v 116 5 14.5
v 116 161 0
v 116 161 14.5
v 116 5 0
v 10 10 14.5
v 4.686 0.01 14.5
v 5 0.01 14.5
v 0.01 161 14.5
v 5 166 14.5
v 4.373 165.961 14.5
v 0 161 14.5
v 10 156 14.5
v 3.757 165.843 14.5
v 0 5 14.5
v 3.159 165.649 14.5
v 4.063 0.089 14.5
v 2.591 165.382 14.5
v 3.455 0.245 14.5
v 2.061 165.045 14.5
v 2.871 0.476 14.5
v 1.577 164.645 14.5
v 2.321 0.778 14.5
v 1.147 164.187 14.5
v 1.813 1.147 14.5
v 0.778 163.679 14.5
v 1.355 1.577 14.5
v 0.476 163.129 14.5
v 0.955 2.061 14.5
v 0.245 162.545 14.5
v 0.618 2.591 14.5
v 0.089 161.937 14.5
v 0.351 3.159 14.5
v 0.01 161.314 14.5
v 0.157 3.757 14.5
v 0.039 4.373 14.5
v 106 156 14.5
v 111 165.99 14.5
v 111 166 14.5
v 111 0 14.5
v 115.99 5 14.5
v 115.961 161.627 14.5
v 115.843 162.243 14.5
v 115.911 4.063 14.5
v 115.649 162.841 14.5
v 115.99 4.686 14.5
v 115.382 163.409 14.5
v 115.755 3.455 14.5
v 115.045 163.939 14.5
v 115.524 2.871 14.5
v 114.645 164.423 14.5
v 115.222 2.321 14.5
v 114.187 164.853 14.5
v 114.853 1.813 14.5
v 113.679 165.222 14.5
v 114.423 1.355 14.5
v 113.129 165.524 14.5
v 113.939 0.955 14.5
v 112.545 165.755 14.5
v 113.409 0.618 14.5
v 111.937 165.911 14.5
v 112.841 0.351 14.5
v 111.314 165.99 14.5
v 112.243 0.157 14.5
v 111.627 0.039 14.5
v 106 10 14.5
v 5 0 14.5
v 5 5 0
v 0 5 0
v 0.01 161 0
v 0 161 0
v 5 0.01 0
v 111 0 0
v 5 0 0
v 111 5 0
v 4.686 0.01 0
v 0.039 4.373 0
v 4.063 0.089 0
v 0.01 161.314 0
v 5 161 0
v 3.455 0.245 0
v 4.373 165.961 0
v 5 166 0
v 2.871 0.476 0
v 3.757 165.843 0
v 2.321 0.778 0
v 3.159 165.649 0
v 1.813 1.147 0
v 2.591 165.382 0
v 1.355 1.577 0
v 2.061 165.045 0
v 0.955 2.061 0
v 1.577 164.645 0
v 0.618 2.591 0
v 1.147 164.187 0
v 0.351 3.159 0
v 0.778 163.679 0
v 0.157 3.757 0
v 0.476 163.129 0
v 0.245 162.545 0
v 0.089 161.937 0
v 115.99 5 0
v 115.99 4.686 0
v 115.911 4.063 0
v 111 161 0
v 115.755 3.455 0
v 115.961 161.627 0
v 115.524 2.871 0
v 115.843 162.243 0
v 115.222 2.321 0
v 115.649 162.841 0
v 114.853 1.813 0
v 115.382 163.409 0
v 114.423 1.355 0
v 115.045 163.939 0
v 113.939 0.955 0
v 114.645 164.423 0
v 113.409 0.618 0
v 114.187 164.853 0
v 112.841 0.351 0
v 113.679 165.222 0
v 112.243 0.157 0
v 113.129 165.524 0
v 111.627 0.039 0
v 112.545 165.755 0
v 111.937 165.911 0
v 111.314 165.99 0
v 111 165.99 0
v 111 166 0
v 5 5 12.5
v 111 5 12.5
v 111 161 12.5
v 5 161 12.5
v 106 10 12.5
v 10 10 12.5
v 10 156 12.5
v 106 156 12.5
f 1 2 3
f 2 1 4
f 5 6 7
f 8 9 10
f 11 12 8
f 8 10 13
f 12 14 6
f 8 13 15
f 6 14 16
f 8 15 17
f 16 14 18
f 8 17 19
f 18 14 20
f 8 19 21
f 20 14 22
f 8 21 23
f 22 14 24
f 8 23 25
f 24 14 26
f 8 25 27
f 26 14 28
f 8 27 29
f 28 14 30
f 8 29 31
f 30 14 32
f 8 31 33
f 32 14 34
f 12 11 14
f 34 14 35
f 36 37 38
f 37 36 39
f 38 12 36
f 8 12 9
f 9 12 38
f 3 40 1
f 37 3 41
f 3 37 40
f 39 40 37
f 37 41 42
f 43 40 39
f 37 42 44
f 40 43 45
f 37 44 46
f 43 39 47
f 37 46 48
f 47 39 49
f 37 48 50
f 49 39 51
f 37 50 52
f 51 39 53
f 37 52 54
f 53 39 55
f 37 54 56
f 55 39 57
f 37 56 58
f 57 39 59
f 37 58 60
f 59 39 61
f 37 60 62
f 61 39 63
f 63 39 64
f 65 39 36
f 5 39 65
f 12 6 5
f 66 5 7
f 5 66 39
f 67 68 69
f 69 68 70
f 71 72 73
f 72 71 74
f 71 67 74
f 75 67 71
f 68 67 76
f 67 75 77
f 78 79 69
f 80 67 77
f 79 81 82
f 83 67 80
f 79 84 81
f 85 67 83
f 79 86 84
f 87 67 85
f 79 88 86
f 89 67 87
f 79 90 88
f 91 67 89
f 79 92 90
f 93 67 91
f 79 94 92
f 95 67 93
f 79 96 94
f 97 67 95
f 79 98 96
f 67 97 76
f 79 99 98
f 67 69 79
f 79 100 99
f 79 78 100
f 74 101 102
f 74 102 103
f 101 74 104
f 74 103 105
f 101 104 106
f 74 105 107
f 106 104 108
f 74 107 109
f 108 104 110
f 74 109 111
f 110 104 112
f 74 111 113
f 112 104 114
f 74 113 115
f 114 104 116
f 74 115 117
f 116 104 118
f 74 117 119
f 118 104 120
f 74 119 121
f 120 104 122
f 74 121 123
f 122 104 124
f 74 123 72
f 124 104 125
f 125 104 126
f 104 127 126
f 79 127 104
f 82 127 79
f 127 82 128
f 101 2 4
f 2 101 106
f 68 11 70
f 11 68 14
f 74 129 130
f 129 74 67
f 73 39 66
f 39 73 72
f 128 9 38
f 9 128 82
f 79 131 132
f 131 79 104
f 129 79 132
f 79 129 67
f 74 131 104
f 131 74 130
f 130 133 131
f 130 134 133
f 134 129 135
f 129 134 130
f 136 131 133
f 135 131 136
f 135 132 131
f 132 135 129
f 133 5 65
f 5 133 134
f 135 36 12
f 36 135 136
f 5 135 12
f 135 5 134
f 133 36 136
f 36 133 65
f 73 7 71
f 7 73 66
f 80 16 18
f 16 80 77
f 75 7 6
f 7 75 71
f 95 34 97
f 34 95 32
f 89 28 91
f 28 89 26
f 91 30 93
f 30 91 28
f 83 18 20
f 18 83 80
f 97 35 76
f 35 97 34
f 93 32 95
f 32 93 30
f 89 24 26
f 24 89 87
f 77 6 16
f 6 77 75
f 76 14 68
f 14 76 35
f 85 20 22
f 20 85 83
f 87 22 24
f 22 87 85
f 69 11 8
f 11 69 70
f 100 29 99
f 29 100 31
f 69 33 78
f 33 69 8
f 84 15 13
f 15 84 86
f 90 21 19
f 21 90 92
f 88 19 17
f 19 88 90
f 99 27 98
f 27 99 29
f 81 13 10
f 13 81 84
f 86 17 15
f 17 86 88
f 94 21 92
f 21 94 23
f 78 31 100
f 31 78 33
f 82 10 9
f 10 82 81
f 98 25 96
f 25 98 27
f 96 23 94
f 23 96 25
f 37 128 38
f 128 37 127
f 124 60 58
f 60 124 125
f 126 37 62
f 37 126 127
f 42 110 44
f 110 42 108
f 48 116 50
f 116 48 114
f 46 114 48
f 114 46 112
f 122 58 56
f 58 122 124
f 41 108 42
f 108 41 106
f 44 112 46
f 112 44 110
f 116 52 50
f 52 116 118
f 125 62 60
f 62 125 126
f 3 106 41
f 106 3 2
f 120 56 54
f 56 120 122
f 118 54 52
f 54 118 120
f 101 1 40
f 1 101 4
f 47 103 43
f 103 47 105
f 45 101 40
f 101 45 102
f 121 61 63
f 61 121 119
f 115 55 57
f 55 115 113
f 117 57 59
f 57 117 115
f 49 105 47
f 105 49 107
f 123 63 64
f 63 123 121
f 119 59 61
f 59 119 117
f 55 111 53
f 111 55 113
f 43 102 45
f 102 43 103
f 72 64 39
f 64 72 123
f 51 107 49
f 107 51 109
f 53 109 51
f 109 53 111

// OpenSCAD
$fn=50;
// Width of the image format
image_width = 100;
// Height of the image format
image_length = 150;
// Tolerance of the image (normally the print is a few mm bigger)
image_tolerance = 2;
// Height of the Frame (10, 20, 40, 80, etc.)
height=10;
// Height of the small image border on top of the base plate, to get a glas front between image and cover
image_border_height = 2.5;
// Strength of the border
cover_border_strength = 5;
// Strength of the Head (which borders the image)
cover_head_strength=2;
// Width of the Head (which borders the image)
cover_border_width = 5;
// Border Radius
border_radius = 5;
full_height = height+image_border_height+cover_head_strength;

// add 0 to some values, to hide it in the customizer UI
image_border_width = 2+0;

width=image_width+image_border_width*2+image_tolerance+cover_border_strength*2; // 106, 156
length=image_length+image_border_width*2+image_tolerance+cover_border_strength*2; // 156, 206,330
y_spacing = 8+0;
x_spacing = 8+0;

module RoundBorder(r,h) {
    translate([r,r,0]) difference() {
        translate([-r,-r,0]) cube([r,r,h]);
        cylinder(h=h, r=r);
    }
}

difference() {
    union() {
        // base
        union() {
            cube([width, cover_border_strength, full_height]);
            translate([0,length-cover_border_strength,0]) cube([width, cover_border_strength, full_height]);
            translate([0,0,0]) cube([cover_border_strength, length, full_height]);
            translate([width-cover_border_strength,0,0]) cube([cover_border_strength, length, full_height]);
        }

        // head
        translate([0,0,full_height-cover_head_strength]) union() {
            cube([width, cover_border_strength+cover_border_width, cover_head_strength]);
            translate([0,length-cover_border_strength-cover_border_width,0]) cube([width, cover_border_strength+cover_border_width, cover_head_strength]);
            translate([0,0,0]) cube([cover_border_strength+cover_border_width, length, cover_head_strength]);
            translate([width-cover_border_strength-cover_border_width,0,0]) cube([cover_border_strength+cover_border_width, length, cover_head_strength]);
        }
    }
    RoundBorder(r=border_radius, h=full_height);
    translate([0,length,0]) rotate([0,0,-90]) RoundBorder(r=border_radius, h=full_height);
    translate([width,length,0]) rotate([0,0,180]) RoundBorder(r=border_radius, h=full_height);
    translate([width,0,0]) rotate([0,0,90]) RoundBorder(r=border_radius, h=full_height);
}
